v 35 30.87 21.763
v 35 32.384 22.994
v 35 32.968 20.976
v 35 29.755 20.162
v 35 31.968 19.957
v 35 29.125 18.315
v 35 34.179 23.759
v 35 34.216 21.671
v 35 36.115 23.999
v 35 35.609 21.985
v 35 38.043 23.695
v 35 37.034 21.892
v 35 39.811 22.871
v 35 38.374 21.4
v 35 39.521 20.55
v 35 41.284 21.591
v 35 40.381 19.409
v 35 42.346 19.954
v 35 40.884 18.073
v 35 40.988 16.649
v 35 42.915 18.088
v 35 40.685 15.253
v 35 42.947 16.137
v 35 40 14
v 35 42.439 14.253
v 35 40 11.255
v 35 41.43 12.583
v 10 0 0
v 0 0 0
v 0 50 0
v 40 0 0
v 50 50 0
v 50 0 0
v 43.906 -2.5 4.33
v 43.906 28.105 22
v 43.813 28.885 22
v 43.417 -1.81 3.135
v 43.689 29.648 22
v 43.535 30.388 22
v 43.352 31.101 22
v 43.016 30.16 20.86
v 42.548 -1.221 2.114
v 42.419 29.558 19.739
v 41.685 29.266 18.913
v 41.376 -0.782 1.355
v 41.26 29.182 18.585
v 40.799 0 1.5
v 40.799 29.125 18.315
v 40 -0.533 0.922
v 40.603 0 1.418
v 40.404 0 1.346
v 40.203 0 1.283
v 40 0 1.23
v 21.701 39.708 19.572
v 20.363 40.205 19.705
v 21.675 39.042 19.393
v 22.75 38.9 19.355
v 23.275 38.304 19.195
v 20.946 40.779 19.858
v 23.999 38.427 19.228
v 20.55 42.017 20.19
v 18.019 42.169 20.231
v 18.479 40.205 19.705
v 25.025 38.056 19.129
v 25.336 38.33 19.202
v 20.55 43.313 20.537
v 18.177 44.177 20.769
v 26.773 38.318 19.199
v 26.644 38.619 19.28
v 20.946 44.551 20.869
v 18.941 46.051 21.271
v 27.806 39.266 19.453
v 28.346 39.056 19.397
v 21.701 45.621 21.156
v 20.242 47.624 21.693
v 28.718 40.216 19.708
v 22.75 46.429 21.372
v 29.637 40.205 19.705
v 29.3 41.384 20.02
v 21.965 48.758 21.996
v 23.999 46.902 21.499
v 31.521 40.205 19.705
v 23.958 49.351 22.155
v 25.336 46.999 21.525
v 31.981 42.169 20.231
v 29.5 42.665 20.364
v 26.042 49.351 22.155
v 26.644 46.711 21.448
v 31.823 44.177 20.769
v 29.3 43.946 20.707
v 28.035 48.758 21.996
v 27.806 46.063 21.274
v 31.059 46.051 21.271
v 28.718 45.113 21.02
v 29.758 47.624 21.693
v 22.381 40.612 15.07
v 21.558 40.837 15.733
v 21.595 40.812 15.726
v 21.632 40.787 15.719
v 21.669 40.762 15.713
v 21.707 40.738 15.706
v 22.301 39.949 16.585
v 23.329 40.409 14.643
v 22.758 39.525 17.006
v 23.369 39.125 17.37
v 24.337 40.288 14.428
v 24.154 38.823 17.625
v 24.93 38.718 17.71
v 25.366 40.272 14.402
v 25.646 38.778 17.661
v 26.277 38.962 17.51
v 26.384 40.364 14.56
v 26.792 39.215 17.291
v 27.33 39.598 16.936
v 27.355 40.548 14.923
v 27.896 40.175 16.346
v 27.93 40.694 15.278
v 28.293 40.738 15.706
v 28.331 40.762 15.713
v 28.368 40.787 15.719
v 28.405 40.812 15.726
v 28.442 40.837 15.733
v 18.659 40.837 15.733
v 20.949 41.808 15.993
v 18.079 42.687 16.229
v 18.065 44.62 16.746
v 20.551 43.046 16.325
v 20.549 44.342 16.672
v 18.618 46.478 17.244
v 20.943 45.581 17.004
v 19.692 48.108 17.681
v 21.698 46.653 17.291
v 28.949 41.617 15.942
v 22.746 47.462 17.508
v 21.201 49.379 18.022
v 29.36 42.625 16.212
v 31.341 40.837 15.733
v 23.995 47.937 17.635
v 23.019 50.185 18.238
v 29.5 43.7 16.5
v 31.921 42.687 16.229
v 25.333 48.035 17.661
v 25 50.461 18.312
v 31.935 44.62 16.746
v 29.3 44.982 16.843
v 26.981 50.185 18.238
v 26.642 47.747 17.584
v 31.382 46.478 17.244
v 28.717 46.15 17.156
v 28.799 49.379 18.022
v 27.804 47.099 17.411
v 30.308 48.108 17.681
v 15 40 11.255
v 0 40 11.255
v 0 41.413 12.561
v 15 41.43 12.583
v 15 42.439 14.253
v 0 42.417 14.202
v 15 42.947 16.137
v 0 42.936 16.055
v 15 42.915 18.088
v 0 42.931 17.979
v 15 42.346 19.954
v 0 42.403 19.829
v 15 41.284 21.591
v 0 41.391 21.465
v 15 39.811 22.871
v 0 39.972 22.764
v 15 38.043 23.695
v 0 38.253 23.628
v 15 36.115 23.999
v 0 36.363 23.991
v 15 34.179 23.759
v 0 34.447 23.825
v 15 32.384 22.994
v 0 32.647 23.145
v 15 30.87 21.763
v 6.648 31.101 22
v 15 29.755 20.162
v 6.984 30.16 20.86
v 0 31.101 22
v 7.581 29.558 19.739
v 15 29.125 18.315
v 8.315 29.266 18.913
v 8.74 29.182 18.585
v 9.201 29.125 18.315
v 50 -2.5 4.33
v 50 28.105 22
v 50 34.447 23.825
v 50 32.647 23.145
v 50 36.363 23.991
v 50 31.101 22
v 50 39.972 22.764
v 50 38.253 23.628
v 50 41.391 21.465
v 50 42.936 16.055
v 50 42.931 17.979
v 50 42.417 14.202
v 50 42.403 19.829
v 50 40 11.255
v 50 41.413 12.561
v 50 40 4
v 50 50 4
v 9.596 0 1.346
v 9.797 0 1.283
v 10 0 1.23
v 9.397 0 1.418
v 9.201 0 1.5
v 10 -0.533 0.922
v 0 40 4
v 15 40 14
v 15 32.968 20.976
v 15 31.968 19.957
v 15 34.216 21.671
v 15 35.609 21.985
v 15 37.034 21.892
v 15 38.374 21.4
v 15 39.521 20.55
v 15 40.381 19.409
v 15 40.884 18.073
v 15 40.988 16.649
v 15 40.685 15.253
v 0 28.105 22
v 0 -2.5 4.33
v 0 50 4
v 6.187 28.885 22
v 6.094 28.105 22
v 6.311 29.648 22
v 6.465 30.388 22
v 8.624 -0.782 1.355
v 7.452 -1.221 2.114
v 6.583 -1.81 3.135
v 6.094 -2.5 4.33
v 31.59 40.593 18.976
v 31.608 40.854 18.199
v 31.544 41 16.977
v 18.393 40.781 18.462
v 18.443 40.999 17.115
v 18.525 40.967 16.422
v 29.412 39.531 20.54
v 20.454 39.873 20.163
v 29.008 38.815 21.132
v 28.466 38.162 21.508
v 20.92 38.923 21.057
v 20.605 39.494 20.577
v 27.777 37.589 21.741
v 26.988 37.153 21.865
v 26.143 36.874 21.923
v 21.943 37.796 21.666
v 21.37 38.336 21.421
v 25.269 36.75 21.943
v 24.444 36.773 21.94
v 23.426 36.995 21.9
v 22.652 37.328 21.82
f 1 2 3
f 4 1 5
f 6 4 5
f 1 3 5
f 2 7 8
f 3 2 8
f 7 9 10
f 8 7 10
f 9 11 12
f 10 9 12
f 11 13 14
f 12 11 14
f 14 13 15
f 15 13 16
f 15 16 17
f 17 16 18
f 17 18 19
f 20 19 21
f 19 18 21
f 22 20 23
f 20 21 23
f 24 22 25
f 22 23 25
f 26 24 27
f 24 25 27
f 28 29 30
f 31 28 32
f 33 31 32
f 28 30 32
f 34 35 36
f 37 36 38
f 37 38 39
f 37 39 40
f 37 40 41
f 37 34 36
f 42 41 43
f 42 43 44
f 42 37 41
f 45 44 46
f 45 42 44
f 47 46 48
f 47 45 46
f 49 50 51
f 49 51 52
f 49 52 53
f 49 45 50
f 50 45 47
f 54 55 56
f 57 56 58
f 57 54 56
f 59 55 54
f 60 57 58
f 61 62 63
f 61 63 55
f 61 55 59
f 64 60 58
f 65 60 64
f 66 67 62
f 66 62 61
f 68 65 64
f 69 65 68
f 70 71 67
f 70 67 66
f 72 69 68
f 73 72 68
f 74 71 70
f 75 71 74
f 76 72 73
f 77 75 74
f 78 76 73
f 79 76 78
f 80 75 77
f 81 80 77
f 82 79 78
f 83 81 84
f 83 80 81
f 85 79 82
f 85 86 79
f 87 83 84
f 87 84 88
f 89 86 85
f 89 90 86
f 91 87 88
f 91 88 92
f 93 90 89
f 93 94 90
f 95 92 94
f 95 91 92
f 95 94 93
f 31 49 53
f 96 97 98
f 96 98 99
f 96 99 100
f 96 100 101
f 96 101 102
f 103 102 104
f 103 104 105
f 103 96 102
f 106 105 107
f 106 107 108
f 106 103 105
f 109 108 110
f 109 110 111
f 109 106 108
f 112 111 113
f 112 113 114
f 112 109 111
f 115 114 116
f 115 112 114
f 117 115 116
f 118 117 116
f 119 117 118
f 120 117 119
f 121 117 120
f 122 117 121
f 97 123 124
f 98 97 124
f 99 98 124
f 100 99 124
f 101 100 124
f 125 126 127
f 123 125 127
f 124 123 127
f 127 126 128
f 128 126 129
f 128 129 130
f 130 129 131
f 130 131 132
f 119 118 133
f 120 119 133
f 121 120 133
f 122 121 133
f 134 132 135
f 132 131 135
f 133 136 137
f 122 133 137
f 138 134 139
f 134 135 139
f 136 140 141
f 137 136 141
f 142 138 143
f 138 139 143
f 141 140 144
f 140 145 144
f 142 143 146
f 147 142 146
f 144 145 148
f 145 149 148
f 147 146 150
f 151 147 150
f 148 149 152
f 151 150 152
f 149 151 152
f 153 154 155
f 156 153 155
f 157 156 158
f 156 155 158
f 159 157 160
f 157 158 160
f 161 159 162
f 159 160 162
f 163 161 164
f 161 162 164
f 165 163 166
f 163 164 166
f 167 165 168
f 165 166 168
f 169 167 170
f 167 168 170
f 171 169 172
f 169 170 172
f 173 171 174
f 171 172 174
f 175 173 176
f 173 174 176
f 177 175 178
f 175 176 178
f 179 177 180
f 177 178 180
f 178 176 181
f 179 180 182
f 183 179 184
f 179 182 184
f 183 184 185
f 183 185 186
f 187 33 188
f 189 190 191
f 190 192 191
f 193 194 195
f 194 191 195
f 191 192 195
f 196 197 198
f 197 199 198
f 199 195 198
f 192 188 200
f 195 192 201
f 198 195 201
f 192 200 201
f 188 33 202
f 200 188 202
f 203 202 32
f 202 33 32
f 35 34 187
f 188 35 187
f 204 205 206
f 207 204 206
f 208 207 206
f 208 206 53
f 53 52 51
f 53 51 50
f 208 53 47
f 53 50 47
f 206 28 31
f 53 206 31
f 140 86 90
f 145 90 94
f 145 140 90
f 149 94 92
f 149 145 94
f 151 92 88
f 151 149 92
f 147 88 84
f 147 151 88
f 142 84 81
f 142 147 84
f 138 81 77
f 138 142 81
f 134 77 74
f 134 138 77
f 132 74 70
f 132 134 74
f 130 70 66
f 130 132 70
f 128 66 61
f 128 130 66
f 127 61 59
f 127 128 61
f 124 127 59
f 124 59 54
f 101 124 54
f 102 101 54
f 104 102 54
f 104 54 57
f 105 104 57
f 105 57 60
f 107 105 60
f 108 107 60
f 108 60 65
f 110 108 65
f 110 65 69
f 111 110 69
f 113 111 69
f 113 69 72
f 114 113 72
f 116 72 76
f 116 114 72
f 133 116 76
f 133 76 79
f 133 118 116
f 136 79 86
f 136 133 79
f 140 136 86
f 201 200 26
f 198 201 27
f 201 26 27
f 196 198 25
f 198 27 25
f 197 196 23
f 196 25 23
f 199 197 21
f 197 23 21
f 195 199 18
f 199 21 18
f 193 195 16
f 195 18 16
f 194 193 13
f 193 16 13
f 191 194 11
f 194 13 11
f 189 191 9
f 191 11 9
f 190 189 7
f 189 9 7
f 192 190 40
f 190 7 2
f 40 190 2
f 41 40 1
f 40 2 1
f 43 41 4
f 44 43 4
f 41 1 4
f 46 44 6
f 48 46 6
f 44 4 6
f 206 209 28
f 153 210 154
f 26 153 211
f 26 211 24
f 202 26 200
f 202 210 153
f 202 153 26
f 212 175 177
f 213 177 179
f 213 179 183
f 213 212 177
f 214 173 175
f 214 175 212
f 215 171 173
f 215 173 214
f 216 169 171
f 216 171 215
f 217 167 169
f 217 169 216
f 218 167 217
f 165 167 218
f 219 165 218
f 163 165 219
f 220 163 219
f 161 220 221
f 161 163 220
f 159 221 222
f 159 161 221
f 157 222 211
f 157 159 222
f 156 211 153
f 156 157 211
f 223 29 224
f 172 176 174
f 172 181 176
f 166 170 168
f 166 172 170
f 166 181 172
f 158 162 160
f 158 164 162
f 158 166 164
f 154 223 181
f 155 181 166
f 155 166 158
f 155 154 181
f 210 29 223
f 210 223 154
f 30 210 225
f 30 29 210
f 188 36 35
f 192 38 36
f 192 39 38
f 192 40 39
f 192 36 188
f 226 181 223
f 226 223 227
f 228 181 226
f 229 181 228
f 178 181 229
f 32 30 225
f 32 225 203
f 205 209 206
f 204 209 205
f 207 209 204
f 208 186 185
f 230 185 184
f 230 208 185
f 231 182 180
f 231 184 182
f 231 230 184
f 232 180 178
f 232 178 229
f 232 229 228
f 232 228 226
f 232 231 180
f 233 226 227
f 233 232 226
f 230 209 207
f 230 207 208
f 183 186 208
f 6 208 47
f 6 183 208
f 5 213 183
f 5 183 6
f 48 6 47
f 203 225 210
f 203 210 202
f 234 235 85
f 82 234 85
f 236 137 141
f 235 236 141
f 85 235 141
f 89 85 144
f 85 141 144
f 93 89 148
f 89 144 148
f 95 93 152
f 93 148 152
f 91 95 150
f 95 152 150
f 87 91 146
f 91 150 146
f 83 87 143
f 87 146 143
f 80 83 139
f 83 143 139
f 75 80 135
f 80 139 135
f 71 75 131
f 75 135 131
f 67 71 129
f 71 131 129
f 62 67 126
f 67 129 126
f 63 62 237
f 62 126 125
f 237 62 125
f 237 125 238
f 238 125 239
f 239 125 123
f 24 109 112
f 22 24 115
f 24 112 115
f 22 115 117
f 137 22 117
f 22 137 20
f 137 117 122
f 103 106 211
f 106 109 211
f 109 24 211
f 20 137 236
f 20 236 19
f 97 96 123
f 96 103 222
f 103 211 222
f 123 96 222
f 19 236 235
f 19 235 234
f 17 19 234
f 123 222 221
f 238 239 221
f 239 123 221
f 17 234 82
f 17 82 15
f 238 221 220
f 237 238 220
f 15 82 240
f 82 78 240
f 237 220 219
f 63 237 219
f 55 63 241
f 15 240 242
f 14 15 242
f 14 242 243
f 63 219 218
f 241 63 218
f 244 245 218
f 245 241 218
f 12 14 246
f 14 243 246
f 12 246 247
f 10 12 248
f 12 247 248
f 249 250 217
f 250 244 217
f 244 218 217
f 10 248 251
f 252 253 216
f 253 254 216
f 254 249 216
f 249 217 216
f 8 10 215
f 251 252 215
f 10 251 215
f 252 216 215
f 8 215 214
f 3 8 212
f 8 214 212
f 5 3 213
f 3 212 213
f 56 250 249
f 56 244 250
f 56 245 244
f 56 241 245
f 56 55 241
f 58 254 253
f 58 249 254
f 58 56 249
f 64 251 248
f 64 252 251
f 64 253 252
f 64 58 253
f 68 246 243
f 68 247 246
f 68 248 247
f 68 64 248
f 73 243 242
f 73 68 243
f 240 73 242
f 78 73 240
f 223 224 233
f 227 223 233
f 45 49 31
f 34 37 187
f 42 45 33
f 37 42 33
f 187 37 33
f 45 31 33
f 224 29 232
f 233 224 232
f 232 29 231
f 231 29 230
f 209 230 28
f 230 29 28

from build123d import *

# Parameters (mm, degrees)
CYLINDER004_R               = 7
CYLINDER004_DEPTH           = 15
CYLINDER005_R               = 7
CYLINDER005_DEPTH           = 15
BOX006_W                    = 50
BOX006_H                    = 10
BOX006_DEPTH                = 4
CYLINDER007_R               = 4.5
CYLINDER007_DEPTH           = 4
CYLINDER007_PLACEMENT_ANGLE = 15
CYLINDER006_R               = 7
CYLINDER006_DEPTH           = 4
CYLINDER006_PLACEMENT_ANGLE = 15
BOX005_W                    = 10
BOX005_H                    = 10
BOX005_DEPTH                = 10
CYLINDER002_R               = 5
CYLINDER002_DEPTH           = 45
CYLINDER002_PLACEMENT_ANGLE = 60
BOX003_W                    = 10
BOX003_H                    = 40
BOX003_DEPTH                = 5
BOX003_PLACEMENT_ANGLE      = 30
CYLINDER003_R               = 6
CYLINDER003_DEPTH           = 20
CYLINDER003_PLACEMENT_ANGLE = 25
CYLINDER_R                  = 5
CYLINDER_DEPTH              = 50
BOX001_W                    = 50
BOX001_H                    = 40
BOX001_DEPTH                = 17
BOX001_PLACEMENT_ANGLE      = 30
BOX_W                       = 50
BOX_H                       = 40
BOX_DEPTH                   = 20
BOX004_W                    = 10
BOX004_H                    = 10
BOX004_DEPTH                = 10
CYLINDER001_R               = 5
CYLINDER001_DEPTH           = 45
CYLINDER001_PLACEMENT_ANGLE = 60
BOX002_W                    = 10
BOX002_H                    = 40
BOX002_DEPTH                = 5
BOX002_PLACEMENT_ANGLE      = 30


with BuildPart() as cylinder004:
    # Cylinder004 → Cylinder004 (new body)
    with BuildSketch(Plane(origin=(0, 36, 17), x_dir=(0, 0, -1), z_dir=(1, 0, 0))):
        Circle(CYLINDER004_R)
    extrude(amount=CYLINDER004_DEPTH)


with BuildPart() as cylinder005:
    # Cylinder005 → Cylinder005 (new body)
    with BuildSketch(Plane(origin=(35, 36, 17), x_dir=(0, 0, -1), z_dir=(1, 0, 0))):
        Circle(CYLINDER005_R)
    extrude(amount=CYLINDER005_DEPTH)


with BuildPart() as cube006:
    # Box006 → Box006 (new body)
    with BuildSketch(Plane(origin=(0, 40, 0), x_dir=(1, 0, 0), z_dir=(0, 0, 1))):
        with Locations((25, 5)):
            Rectangle(BOX006_W, BOX006_H)
    extrude(amount=BOX006_DEPTH)


with BuildPart() as cylinder007:
    # Cylinder007 → Cylinder007 (new body)
    with BuildSketch(Plane.XY):
        Circle(CYLINDER007_R)
    extrude(amount=CYLINDER007_DEPTH)


with BuildPart() as cylinder007_1:
    # Cylinder007 placement: moved
    add(cylinder007.part.moved(Location((25, 43.7, 16.5))).rotate(Axis((25, 43.7, 16.5), (1, 0, 0)), CYLINDER007_PLACEMENT_ANGLE))


with BuildPart() as cut006:
    # Cylinder006 → Cylinder006 (new body)
    with BuildSketch(Plane.XY):
        Circle(CYLINDER006_R)
    extrude(amount=CYLINDER006_DEPTH)


with BuildPart() as cut006_1:
    # Cylinder006 placement: moved
    add(cut006.part.moved(Location((25, 43.7, 16.5))).rotate(Axis((25, 43.7, 16.5), (1, 0, 0)), CYLINDER006_PLACEMENT_ANGLE))

    # Cut006: cut Cylinder007
    add(cylinder007_1.part, mode=Mode.SUBTRACT)


with BuildPart() as cube005:
    # Box005 → Box005 (new body)
    with BuildSketch(Plane(origin=(40, 27, 22), x_dir=(1, 0, 0), z_dir=(0, 0, 1))):
        with Locations((5, 5)):
            Rectangle(BOX005_W, BOX005_H)
    extrude(amount=BOX005_DEPTH)


with BuildPart() as cylinder002:
    # Cylinder002 → Cylinder002 (new body)
    with BuildSketch(Plane.XY):
        Circle(CYLINDER002_R)
    extrude(amount=CYLINDER002_DEPTH)


with BuildPart() as cylinder002_1:
    # Cylinder002 placement: moved
    add(cylinder002.part.moved(Location((39, -5, 4))).rotate(Axis((39, -5, 4), (-1, 0, 0)), CYLINDER002_PLACEMENT_ANGLE))


with BuildPart() as cut004:
    # Box003 → Box003 (new body)
    with BuildSketch(Plane.XY):
        with Locations((5, 20)):
            Rectangle(BOX003_W, BOX003_H)
    extrude(amount=BOX003_DEPTH)


with BuildPart() as cut004_1:
    # Box003 placement: moved
    add(cut004.part.moved(Location((40, 0, 0))).rotate(Axis((40, 0, 0), (1, 0, 0)), BOX003_PLACEMENT_ANGLE))

    # Cut002: cut Cylinder002
    add(cylinder002_1.part, mode=Mode.SUBTRACT)

    # Cut004: cut Cube005
    add(cube005.part, mode=Mode.SUBTRACT)


with BuildPart() as cylinder003:
    # Cylinder003 → Cylinder003 (new body)
    with BuildSketch(Plane.XY):
        Circle(CYLINDER003_R)
    extrude(amount=CYLINDER003_DEPTH)


with BuildPart() as cylinder003_1:
    # Cylinder003 placement: moved
    add(cylinder003.part.moved(Location((25, 48, 12))).rotate(Axis((25, 48, 12), (1, 0, 0)), CYLINDER003_PLACEMENT_ANGLE))


with BuildPart() as cylinder:
    # Cylinder → Cylinder (new body)
    with BuildSketch(Plane(origin=(0, 36, 17), x_dir=(0, 0, -1), z_dir=(1, 0, 0))):
        Circle(CYLINDER_R)
    extrude(amount=CYLINDER_DEPTH)


with BuildPart() as cube001:
    # Box001 → Box001 (new body)
    with BuildSketch(Plane.XY):
        with Locations((25, 20)):
            Rectangle(BOX001_W, BOX001_H)
    extrude(amount=BOX001_DEPTH)


with BuildPart() as cube001_1:
    # Box001 placement: moved
    add(cube001.part.moved(Location((0, 0, 1.5))).rotate(Axis((0, 0, 1.5), (1, 0, 0)), BOX001_PLACEMENT_ANGLE))


with BuildPart() as cut005:
    # Box → Box (new body)
    with BuildSketch(Plane.XY):
        with Locations((25, 20)):
            Rectangle(BOX_W, BOX_H)
    extrude(amount=BOX_DEPTH)

    # Cut: cut Cube001
    add(cube001_1.part, mode=Mode.SUBTRACT)

    # Fusion: union Cylinder
    add(cylinder.part)

    # Cut005: cut Cylinder003
    add(cylinder003_1.part, mode=Mode.SUBTRACT)


with BuildPart() as cube004:
    # Box004 → Box004 (new body)
    with BuildSketch(Plane(origin=(0, 27, 22), x_dir=(1, 0, 0), z_dir=(0, 0, 1))):
        with Locations((5, 5)):
            Rectangle(BOX004_W, BOX004_H)
    extrude(amount=BOX004_DEPTH)


with BuildPart() as cylinder001:
    # Cylinder001 → Cylinder001 (new body)
    with BuildSketch(Plane.XY):
        Circle(CYLINDER001_R)
    extrude(amount=CYLINDER001_DEPTH)


with BuildPart() as cylinder001_1:
    # Cylinder001 placement: moved
    add(cylinder001.part.moved(Location((11, -5, 4))).rotate(Axis((11, -5, 4), (-1, 0, 0)), CYLINDER001_PLACEMENT_ANGLE))


with BuildPart() as fusion002:
    # Box002 → Box002 (new body)
    with BuildSketch(Plane.XY):
        with Locations((5, 20)):
            Rectangle(BOX002_W, BOX002_H)
    extrude(amount=BOX002_DEPTH)


with BuildPart() as fusion002_1:
    # Box002 placement: moved
    add(fusion002.part.rotate(Axis((0, 0, 0), (1, 0, 0)), BOX002_PLACEMENT_ANGLE))

    # Cut001: cut Cylinder001
    add(cylinder001_1.part, mode=Mode.SUBTRACT)

    # Cut003: cut Cube004
    add(cube004.part, mode=Mode.SUBTRACT)

    # Fusion001: union Cut004, Cut005
    add(cut004_1.part)
    add(cut005.part)

    # Fusion002: union Cylinder004, Cylinder005, Cube006, Cut006
    add(cylinder004.part)
    add(cylinder005.part)
    add(cube006.part)
    add(cut006_1.part)


solid = fusion002_1.part
